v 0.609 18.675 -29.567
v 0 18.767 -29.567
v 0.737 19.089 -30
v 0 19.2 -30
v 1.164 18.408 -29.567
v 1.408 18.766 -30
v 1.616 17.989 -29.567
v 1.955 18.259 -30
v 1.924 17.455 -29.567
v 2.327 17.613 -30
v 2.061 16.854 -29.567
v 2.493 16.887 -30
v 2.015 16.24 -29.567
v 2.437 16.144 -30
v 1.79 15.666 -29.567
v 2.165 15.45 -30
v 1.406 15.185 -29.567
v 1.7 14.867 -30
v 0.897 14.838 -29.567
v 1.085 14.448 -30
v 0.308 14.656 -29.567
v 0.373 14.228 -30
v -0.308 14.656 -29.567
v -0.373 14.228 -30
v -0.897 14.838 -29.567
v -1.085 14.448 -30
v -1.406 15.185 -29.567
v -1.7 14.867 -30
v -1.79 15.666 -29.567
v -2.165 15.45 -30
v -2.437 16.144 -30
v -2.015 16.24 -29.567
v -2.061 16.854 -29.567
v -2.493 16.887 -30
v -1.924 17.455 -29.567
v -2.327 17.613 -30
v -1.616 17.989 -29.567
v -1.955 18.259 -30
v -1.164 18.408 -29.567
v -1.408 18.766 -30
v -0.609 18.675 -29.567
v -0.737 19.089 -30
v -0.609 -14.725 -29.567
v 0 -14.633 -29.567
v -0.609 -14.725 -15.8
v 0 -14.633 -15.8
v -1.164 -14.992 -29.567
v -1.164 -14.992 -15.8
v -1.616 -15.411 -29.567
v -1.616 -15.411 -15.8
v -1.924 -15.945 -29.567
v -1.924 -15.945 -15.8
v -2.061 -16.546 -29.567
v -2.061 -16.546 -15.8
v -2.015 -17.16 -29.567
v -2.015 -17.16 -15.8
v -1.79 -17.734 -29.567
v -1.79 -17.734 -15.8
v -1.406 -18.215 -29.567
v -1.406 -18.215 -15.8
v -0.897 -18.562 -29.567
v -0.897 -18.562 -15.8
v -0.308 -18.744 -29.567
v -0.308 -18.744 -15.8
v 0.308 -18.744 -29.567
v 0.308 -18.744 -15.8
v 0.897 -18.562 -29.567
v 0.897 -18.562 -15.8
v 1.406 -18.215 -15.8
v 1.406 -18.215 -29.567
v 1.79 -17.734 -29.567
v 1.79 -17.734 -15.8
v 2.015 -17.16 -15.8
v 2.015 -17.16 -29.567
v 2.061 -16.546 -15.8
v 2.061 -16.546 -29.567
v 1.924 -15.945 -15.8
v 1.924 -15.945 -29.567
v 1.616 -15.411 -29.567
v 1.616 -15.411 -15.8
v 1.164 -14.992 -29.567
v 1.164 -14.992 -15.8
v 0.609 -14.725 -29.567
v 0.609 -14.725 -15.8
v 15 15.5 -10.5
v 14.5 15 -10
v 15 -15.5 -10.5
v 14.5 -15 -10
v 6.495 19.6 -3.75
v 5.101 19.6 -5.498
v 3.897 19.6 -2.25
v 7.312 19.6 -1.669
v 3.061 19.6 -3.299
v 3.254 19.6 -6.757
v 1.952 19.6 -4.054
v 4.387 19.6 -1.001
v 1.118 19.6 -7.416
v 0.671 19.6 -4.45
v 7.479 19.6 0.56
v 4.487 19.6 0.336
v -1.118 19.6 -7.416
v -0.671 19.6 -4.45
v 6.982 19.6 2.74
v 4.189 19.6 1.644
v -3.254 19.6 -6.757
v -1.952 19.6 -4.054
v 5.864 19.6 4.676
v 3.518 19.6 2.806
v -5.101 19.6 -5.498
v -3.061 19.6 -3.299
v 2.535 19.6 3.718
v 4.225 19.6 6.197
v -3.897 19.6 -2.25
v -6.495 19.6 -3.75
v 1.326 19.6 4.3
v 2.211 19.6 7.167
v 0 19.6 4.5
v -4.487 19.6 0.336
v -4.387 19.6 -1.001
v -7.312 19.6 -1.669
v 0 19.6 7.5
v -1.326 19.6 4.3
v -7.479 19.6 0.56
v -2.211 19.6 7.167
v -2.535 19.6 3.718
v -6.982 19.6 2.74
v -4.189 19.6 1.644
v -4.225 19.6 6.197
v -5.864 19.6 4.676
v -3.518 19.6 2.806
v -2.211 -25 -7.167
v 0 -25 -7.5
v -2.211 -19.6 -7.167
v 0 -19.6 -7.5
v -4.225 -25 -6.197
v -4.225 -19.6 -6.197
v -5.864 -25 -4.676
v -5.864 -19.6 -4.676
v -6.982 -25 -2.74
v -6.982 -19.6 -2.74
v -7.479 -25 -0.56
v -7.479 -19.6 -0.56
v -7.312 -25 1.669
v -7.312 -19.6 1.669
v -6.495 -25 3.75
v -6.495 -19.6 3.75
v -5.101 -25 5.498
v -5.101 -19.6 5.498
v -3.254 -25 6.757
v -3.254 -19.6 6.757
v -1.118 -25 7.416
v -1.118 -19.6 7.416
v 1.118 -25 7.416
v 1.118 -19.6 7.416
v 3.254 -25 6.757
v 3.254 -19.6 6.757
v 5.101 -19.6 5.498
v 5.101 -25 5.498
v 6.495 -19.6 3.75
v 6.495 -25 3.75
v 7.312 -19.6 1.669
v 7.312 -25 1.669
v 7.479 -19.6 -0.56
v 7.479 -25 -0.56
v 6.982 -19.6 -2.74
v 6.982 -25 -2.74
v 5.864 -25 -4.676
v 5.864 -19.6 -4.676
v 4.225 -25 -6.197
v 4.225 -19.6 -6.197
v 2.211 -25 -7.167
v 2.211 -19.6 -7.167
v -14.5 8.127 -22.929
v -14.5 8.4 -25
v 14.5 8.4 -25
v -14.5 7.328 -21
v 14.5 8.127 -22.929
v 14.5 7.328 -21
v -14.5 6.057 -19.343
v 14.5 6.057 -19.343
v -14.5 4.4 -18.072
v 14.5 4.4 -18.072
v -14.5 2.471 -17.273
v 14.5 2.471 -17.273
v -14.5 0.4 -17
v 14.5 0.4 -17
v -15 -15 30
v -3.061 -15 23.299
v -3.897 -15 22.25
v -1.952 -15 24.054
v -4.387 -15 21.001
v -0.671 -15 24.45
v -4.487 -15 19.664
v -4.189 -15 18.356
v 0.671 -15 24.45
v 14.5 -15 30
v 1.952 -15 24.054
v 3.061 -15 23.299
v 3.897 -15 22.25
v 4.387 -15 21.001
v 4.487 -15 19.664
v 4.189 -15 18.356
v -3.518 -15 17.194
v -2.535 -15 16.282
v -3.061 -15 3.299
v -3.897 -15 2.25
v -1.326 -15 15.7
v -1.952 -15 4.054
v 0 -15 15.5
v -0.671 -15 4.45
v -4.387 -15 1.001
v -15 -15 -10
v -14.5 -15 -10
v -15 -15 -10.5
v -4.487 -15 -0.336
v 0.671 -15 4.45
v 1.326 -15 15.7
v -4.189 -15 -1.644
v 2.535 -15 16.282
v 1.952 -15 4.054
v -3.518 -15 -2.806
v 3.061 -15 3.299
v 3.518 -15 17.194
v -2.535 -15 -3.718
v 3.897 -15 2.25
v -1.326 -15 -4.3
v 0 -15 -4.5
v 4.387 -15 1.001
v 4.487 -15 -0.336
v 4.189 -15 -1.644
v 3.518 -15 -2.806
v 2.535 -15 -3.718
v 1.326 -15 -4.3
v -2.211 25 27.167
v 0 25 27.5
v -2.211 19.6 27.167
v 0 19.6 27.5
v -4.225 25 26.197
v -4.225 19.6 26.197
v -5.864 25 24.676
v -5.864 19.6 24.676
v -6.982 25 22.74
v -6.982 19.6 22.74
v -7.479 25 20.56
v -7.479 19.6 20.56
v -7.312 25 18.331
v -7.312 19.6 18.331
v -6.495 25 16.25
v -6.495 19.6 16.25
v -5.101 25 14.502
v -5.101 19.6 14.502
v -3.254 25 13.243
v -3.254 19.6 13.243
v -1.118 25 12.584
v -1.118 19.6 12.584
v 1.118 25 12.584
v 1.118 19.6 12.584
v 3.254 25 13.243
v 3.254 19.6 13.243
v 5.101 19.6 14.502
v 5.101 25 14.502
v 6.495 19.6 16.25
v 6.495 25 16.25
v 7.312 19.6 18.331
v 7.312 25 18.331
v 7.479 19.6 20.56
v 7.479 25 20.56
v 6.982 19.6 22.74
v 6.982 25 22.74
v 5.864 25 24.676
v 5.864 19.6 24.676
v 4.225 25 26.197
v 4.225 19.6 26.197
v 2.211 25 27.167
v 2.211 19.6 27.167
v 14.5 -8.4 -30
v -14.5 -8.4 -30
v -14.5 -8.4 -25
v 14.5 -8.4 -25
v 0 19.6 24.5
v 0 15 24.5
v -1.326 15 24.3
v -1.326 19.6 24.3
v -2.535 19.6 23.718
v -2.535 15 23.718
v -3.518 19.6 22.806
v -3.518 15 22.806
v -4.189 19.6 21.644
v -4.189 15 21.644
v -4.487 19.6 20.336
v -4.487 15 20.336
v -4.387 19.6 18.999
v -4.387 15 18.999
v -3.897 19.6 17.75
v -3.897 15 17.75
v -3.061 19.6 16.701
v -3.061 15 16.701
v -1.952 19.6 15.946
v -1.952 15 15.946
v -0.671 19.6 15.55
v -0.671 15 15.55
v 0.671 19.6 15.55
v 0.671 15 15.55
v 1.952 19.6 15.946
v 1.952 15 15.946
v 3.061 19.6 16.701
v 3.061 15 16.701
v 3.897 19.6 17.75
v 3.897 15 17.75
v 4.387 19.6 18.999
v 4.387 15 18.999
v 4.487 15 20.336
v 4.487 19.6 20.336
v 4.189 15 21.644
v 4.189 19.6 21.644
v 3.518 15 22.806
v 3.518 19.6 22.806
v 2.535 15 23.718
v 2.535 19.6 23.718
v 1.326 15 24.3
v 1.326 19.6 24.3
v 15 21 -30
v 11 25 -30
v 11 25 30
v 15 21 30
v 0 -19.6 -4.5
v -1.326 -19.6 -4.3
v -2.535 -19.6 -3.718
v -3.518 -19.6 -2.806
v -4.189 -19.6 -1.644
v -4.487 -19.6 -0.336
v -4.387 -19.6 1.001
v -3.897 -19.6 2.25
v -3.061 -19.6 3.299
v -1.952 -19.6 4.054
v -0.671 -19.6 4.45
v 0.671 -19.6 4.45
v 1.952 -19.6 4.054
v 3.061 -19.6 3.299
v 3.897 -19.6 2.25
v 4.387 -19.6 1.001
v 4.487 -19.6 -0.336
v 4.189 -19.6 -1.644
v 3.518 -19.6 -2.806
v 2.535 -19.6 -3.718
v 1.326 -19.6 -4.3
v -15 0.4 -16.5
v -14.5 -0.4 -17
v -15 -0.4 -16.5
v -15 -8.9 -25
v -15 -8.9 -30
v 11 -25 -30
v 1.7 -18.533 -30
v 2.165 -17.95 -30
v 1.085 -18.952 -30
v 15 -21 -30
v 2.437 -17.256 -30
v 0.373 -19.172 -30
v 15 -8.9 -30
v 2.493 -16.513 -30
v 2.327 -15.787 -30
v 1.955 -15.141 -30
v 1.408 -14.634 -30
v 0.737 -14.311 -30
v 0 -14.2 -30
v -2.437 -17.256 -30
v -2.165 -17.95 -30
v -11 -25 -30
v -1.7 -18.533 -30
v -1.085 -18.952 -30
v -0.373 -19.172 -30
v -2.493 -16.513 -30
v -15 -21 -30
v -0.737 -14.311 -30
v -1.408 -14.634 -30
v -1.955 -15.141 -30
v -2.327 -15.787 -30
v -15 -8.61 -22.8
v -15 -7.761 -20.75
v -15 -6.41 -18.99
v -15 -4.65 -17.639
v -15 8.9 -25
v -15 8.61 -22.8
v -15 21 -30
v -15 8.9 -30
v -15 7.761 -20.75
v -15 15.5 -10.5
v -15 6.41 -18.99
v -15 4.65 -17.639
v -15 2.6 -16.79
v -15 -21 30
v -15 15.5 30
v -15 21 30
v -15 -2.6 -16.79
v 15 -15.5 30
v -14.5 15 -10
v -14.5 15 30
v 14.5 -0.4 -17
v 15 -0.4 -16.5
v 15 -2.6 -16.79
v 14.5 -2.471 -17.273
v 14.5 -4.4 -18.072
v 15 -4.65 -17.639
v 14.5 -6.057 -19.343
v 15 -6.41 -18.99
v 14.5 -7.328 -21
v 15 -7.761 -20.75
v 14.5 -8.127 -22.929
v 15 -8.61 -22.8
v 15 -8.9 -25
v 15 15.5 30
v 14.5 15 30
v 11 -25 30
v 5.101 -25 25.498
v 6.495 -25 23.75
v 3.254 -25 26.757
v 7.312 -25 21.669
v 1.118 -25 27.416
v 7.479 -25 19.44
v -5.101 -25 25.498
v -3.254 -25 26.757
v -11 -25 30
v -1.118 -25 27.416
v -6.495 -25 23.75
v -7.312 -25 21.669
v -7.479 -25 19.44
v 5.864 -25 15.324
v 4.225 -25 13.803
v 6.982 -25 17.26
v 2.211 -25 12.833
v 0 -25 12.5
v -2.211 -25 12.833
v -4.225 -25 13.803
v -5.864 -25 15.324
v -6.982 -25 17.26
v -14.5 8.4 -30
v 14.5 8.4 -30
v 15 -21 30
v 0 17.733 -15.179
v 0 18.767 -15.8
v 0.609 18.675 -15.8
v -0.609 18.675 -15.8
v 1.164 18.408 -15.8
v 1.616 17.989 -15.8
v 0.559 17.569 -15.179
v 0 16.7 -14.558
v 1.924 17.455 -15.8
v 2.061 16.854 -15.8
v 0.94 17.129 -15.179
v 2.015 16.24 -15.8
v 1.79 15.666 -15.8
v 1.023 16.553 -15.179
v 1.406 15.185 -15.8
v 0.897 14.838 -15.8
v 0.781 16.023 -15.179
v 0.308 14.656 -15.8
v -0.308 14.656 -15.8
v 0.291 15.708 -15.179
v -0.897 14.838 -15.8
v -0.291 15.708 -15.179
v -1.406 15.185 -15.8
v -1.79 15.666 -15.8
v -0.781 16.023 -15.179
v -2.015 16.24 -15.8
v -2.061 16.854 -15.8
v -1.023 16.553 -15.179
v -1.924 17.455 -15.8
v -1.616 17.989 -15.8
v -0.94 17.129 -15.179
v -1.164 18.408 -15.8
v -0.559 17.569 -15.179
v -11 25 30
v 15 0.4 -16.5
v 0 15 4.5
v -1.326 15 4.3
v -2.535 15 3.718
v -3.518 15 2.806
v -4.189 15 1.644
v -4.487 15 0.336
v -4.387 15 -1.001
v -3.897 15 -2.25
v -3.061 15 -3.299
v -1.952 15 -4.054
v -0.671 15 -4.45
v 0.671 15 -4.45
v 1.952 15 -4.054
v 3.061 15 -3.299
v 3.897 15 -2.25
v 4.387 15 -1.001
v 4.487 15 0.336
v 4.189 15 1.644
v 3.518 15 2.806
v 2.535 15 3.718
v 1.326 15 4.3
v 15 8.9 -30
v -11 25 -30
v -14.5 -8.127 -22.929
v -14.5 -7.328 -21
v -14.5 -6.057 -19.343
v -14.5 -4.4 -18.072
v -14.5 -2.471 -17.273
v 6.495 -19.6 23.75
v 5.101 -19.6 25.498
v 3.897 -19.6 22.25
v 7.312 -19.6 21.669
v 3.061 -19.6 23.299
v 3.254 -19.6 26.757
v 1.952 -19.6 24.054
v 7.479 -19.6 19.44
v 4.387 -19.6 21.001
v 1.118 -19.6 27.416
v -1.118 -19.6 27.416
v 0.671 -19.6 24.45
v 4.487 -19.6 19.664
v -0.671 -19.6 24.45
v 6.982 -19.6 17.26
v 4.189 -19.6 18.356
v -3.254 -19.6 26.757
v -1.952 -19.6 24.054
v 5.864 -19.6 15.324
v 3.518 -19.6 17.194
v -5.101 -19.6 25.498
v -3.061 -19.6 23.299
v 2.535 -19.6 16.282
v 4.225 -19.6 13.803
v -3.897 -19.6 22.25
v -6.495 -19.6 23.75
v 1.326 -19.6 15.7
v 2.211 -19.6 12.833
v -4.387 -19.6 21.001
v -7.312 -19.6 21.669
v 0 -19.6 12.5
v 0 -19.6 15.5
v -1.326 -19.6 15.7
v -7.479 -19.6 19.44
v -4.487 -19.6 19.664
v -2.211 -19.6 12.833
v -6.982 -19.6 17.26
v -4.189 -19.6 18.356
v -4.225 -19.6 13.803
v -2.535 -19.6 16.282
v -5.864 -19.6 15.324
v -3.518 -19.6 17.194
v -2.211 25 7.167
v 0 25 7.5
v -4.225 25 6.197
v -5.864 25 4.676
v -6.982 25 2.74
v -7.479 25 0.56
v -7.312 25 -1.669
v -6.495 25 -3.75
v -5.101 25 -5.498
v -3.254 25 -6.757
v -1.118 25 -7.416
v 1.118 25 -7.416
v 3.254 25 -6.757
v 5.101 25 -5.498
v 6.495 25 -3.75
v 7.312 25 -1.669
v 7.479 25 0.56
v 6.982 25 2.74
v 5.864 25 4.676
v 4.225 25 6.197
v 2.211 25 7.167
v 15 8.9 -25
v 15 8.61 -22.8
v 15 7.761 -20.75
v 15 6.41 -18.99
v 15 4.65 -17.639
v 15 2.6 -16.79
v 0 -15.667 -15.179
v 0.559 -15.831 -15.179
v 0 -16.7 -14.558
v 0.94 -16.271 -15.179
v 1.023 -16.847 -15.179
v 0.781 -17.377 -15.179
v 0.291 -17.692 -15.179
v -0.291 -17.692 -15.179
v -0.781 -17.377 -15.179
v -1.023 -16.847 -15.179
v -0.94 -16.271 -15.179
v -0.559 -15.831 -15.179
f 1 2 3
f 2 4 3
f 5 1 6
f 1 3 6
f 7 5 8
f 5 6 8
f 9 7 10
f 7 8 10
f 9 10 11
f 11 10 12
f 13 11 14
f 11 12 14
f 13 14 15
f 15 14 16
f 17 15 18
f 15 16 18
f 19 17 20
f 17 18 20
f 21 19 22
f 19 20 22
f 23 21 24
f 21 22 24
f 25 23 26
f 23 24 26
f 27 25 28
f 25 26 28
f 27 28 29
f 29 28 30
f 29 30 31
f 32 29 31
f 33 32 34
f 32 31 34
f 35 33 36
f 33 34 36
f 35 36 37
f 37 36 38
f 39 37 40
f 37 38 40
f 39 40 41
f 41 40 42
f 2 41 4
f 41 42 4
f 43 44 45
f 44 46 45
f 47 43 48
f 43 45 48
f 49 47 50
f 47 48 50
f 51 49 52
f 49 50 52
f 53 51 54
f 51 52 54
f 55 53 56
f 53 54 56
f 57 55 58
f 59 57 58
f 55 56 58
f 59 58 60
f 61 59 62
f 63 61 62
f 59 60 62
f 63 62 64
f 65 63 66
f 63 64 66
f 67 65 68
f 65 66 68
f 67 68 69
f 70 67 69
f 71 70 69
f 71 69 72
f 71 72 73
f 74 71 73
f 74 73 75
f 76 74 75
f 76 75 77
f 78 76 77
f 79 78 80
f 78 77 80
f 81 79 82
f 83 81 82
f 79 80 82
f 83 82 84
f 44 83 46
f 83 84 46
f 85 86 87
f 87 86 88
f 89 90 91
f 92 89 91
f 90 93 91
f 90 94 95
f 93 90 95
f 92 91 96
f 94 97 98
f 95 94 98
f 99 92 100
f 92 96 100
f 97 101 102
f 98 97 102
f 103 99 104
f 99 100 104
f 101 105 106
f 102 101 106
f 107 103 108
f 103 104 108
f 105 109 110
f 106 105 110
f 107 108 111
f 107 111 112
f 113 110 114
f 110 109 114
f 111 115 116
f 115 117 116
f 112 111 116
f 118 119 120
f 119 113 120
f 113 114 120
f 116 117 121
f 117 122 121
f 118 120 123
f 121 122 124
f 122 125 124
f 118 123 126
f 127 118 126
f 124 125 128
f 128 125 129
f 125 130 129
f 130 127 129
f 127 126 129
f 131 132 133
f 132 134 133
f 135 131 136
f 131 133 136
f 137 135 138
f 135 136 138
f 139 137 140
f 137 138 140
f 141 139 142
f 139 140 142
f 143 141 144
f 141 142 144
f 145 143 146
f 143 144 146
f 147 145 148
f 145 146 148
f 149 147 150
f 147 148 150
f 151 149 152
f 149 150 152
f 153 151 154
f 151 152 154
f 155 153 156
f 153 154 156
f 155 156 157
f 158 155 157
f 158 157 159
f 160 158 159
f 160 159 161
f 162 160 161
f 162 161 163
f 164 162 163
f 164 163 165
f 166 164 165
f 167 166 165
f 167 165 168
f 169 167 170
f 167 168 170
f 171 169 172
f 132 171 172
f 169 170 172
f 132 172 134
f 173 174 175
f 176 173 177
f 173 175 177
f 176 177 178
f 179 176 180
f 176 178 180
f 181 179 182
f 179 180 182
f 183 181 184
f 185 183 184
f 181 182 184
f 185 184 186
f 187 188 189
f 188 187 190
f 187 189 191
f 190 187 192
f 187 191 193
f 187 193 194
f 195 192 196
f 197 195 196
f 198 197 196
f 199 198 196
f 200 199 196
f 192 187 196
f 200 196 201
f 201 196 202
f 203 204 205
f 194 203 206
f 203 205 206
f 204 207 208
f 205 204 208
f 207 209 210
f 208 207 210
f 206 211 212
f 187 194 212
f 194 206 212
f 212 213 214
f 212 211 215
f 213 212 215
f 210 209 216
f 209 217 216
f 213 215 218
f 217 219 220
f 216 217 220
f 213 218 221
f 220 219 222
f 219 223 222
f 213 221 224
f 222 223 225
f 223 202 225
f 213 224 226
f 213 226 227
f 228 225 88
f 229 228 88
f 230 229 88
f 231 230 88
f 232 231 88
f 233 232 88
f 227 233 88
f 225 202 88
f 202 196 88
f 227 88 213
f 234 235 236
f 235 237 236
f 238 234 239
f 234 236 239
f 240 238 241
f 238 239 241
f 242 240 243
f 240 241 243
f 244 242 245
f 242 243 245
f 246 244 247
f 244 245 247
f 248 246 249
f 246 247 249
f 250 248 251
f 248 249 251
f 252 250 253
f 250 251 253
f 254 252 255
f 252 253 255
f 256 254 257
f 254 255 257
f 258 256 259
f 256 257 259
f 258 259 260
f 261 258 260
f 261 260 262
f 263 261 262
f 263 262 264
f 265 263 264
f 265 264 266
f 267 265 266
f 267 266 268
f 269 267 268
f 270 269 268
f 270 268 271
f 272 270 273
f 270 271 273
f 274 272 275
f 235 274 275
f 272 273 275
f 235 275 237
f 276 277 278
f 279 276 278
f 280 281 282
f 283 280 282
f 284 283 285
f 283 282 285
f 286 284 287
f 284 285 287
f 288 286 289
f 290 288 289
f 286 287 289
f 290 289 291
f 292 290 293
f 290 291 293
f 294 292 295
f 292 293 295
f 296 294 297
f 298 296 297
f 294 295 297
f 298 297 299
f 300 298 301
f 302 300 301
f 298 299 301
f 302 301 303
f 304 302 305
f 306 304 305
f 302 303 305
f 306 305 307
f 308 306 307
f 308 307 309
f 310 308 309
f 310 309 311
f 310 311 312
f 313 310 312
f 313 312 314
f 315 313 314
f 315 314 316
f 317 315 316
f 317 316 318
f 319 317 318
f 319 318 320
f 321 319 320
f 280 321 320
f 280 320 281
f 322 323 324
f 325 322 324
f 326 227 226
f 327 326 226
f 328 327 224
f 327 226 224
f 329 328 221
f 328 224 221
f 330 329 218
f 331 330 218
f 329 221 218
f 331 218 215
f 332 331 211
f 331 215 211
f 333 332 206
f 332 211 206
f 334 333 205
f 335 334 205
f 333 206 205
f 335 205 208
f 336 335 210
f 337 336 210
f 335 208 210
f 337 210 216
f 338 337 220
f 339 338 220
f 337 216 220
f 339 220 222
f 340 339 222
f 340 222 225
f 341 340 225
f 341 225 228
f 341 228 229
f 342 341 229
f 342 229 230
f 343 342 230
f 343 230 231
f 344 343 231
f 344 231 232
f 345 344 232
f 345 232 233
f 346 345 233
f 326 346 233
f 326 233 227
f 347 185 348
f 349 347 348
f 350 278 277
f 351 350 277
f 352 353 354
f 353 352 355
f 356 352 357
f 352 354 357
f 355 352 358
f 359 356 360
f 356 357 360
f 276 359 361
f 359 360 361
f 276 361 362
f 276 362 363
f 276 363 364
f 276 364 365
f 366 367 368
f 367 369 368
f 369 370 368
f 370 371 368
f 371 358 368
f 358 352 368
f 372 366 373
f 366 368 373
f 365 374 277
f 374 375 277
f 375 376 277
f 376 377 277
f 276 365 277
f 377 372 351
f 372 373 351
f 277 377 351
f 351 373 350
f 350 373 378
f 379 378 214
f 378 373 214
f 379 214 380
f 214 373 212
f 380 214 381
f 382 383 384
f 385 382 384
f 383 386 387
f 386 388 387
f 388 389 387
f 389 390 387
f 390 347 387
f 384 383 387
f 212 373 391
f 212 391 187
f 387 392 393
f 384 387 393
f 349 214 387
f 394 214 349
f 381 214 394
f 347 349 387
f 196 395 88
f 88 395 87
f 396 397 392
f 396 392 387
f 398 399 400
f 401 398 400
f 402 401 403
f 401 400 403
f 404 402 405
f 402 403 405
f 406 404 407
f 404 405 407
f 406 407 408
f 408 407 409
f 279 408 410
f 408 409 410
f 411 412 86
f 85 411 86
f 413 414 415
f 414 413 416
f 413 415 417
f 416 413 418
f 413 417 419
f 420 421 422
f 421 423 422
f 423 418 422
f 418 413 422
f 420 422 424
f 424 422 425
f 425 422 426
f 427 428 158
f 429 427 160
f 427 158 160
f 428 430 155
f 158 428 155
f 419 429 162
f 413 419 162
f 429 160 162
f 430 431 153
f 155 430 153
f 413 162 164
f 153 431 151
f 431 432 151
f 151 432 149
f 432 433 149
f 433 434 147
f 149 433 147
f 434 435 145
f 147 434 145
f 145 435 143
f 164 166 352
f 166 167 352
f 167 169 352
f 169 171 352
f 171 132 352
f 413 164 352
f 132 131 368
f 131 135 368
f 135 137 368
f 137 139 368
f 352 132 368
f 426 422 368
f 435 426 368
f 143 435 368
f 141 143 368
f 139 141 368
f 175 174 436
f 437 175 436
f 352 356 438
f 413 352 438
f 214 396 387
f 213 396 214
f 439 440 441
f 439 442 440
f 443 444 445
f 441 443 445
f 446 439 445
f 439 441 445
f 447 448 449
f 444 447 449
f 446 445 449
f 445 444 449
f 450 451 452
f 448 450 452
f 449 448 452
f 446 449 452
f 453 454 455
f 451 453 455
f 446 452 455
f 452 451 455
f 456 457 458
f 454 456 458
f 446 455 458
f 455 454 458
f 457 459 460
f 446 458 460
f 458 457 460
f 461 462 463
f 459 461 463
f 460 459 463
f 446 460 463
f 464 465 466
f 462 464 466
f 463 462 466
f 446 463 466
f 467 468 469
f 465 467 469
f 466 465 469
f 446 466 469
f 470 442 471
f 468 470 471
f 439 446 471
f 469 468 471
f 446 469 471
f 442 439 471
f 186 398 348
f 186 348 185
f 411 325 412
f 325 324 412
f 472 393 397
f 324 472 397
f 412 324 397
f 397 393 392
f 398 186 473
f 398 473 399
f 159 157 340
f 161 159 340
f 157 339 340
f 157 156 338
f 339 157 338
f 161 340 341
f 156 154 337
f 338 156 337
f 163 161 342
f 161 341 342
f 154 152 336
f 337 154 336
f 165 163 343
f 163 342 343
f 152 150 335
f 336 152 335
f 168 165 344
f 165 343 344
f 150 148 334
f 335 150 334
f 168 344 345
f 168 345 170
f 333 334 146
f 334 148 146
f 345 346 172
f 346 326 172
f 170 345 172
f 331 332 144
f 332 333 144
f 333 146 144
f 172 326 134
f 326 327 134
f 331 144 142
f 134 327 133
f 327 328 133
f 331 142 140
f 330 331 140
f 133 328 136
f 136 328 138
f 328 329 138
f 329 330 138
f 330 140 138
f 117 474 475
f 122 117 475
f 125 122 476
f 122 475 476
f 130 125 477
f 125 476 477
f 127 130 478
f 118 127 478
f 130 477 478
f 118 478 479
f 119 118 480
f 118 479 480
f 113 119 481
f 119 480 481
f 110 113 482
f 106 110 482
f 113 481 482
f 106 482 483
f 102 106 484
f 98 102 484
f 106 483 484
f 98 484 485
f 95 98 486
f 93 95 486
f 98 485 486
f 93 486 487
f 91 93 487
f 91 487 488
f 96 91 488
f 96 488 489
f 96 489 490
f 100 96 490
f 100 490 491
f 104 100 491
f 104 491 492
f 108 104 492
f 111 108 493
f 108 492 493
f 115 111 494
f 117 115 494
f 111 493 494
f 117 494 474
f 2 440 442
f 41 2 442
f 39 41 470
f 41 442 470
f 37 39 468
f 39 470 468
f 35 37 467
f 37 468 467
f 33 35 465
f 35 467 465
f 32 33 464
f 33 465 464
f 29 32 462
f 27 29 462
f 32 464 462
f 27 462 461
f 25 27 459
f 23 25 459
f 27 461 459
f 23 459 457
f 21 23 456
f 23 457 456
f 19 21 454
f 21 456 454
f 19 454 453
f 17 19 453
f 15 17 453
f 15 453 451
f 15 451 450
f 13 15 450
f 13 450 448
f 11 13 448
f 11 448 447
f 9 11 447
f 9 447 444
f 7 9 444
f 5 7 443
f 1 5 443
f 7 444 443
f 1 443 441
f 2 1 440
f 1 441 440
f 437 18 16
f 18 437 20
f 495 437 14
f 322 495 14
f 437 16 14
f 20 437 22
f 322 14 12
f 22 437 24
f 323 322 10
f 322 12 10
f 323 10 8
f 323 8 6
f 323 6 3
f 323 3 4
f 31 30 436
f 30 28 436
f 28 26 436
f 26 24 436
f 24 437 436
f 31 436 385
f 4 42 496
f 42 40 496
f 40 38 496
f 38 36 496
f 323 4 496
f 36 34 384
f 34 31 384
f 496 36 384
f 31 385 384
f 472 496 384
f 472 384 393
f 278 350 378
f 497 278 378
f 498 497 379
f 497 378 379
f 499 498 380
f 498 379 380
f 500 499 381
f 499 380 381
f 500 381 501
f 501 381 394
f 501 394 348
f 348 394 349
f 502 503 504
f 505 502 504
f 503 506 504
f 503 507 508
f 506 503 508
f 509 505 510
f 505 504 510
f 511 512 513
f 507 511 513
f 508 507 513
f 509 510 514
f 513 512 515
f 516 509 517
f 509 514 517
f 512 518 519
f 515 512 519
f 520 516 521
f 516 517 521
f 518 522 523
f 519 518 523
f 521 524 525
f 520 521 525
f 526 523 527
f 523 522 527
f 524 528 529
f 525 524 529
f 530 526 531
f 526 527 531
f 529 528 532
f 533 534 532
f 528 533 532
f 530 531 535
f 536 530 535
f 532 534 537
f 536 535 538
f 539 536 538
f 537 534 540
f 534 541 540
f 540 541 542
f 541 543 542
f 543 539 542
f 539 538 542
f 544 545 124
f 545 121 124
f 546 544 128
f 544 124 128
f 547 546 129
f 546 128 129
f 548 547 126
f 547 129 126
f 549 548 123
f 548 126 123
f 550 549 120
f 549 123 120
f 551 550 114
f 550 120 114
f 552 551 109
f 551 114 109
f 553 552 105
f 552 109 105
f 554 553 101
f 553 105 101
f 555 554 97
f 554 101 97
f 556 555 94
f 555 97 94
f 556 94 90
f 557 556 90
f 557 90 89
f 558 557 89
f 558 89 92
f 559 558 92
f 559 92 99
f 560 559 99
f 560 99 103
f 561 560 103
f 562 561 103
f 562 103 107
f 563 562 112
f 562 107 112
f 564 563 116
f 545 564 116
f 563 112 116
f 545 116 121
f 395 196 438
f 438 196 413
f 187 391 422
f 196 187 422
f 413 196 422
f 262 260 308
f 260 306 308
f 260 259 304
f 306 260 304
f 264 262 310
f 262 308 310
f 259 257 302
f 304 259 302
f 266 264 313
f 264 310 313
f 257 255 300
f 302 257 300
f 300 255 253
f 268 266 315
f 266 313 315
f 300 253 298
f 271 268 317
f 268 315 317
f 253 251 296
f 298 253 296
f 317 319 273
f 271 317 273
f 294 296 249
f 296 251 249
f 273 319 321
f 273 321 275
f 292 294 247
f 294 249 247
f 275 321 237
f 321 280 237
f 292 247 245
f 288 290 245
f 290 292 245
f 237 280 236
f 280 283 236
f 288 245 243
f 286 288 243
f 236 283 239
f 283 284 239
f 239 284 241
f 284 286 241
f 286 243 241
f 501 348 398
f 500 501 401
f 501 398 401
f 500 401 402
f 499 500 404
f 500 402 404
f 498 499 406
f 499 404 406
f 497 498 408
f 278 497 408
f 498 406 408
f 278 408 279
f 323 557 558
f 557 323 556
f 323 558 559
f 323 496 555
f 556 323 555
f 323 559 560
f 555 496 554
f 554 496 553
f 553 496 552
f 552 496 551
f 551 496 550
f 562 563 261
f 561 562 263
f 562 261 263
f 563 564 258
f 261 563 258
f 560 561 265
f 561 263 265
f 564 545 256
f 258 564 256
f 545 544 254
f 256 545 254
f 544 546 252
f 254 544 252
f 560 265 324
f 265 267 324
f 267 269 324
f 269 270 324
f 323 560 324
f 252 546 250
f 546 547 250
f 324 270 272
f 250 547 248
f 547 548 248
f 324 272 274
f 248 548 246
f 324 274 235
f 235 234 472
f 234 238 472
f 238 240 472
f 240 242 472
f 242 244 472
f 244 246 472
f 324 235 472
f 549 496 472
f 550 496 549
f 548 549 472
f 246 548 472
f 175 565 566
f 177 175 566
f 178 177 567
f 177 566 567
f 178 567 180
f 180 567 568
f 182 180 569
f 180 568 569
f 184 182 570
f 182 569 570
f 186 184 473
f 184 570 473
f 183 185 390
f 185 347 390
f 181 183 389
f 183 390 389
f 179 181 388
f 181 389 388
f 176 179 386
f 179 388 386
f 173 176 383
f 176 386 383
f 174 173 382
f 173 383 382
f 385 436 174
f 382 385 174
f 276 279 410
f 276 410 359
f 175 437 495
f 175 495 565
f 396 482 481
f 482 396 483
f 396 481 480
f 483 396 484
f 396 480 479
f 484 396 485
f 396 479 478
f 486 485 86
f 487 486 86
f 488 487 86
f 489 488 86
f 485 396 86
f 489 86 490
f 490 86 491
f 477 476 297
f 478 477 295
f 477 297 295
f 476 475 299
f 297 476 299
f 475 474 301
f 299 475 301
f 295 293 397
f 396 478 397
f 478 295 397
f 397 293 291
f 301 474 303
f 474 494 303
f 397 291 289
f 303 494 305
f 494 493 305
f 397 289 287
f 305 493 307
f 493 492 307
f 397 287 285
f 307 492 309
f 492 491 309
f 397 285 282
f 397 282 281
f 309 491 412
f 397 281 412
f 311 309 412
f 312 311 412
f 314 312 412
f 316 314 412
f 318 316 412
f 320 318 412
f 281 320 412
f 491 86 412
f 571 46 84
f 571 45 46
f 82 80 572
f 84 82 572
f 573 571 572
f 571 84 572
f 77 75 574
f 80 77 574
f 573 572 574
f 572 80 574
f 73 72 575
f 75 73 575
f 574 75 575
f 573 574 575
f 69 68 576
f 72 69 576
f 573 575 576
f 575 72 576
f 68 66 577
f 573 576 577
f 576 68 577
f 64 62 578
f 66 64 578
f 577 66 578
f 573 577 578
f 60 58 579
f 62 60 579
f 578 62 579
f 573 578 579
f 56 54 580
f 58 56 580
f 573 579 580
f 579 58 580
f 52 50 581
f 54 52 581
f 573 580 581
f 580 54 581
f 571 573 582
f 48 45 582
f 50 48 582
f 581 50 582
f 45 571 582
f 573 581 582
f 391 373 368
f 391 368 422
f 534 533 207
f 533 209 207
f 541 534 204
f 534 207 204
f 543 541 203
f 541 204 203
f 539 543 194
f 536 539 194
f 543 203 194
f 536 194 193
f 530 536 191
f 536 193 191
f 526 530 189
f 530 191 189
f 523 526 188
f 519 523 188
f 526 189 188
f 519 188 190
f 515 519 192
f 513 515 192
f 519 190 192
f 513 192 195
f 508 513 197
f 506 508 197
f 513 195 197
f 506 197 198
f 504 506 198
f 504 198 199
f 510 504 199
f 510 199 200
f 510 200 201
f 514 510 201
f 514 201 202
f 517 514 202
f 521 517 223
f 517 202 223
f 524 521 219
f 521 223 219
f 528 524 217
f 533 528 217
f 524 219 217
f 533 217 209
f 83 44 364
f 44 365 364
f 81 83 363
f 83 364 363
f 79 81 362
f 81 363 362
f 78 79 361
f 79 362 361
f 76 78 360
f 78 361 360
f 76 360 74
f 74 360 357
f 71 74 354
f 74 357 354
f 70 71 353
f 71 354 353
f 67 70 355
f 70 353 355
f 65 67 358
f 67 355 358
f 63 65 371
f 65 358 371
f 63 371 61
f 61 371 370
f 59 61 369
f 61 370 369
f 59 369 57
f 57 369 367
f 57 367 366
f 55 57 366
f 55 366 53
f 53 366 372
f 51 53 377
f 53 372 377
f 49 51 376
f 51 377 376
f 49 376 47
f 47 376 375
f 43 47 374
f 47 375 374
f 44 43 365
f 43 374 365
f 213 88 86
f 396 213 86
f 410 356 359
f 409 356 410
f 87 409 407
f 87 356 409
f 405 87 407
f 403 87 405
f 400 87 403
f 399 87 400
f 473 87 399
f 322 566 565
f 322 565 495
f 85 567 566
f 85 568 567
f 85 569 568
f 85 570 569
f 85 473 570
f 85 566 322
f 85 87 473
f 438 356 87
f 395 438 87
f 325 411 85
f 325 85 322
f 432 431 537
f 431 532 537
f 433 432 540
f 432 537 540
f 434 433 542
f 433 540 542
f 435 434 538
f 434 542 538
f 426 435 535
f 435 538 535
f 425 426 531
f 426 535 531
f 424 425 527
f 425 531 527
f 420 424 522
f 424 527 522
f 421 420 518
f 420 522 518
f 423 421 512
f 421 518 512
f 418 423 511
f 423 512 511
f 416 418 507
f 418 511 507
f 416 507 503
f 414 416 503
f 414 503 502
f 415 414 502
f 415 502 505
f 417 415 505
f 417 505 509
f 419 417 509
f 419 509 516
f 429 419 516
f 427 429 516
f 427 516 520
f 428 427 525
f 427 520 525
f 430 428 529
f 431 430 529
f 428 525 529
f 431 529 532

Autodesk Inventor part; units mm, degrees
ref_plane "YZ Plane" through (0, 0, 0) normal (1, 0, 0) x (0, 1, 0)
ref_plane "XZ Plane" through (0, 0, 0) normal (0, 1, 0) x (-1, 0, 0)
ref_plane "XY Plane" through (0, 0, 0) normal (0, 0, 1) x (1, 0, 0)
sketch "Skizze1" plane through (0, 0, 0) normal (1, 0, 0) x (0, 1, 0)
  line L0 (-35, 0) -> (35, 0) construction
  line L1 (0, 42) -> (0, -42) construction
  line L2 (-25, -30) -> (25, -30)
  line L3 (25, -30) -> (25, 30)
  line L4 (25, 30) -> (-25, 30)
  line L5 (-25, 30) -> (-25, -30)
  line L6 (-25, -30) -> (25, 30) construction
  line L7 (25, -30) -> (-25, 30) construction
  point P0 (0, 0)
  dimension "d0" = 50
  dimension "d1" = 60
extrude "Grundkörper" add sketch "Skizze1" along normal mid plane 30
sketch "Skizze2" plane through (15, 0, 0) normal (1, 0, 0) x (0, 0, -1)
  line L0 (-30, 25) -> (-30, -25) construction
  line L1 (0, -35) -> (0, 35) construction
  line L2 (-42, 0) -> (42, 0) construction
  line L3 (-30, -15) -> (10, -15)
  line L4 (10, -15) -> (10, 15)
  line L5 (10, 15) -> (-30, 15)
  line L6 (-30, 15) -> (-30, -15)
  line L7 (30, -25) -> (30, 25) construction
  line L8 (30, -8.4) -> (25, -8.4)
  line L9 (17, -0.4) -> (17, 0.4)
  line L10 (25, 8.4) -> (30, 8.4)
  line L11 (30, -8.4) -> (30, 8.4)
  arc A0 (17, -0.4) -> (25, -8.4) centre (25, -0.4) ccw
  arc A1 (25, 8.4) -> (17, 0.4) centre (25, 0.4) ccw
  point P0 (0, 0)
  dimension "d4" = 40
  dimension "d5" = 30
  dimension "d14" = 13
  dimension "d15" = 16.8
  dimension "d16" = 8
extrude "Ausschnitt" cut sketch "Skizze2" against normal through all
sketch "Skizze4" plane through (-15, -25, -30) normal (0, -1, 0) x (1, 0, 0)
  line L0 (30, 20) -> (0, 20) construction
  line L1 (30, 60) -> (0, 60) construction
  line L2 (15, 72) -> (15, -12) projected
  line L3 (0, 40) -> (30, 40) construction
  line L4 (0, 0) -> (0, 60) construction
  line L5 (30, 60) -> (30, 0) construction
  point P0 (15, 30)
  point P1 (15, 50)
  point P2 (15, 30)
  dimension "d19" = 40
  dimension "d20" = 20
  dimension "d21" = 20
hole "DIN7984_M8_Boh" at (0, -25, 20) at (0, -25, 0) direction (0, 1, 0) diameter 9 end up to surface counterbore diameter 15 counterbore depth 5.4
mirror "Spiegeln_DIN7984_M8_Boh" about plane through (0, 0, 0) normal (0, 1, 0) of "DIN7984_M8_Boh"
sketch "Skizze5" plane through (15, -25, -30) normal (0, 0, -1) x (-1, 0, 0)
  line L0 (0, 0) -> (30, 0) construction
  line L1 (30, 16.6) -> (0, 16.6) construction
  line L2 (30, 50) -> (0, 50) construction
  line L3 (0, 33.4) -> (30, 33.4) construction
  line L4 (15, -10) -> (15, 60) construction
  line L5 (-6, 25) -> (36, 25) construction
  line L6 (15, 16.6) -> (15, 0) construction
  point P0 (15, 25)
  point P1 (15, 8.3)
  point P2 (15, 41.7)
  dimension "d29" = 33.4
hole "M5x10" at (0, -16.7, -30) at (0, 16.7, -30) direction (0, 0, 1) diameter 4.134 depth 14.2 tip angle 118 countersink diameter 5 countersink angle 90 thread size "M5x0.8" class "6H" standard "ISO Metric profile"
sketch "Skizze" plane through (15, -25, -30) normal (0, 0, -1) x (-1, 0, 0)
  circle A0 centre (15, 8.3) radius 2.5 projected
  line L0 (30, 16.6) -> (0, 16.6) projected
  line L1 (0, 0) -> (0, 16.6) projected
  line L2 (0, 0) -> (30, 0) projected
  line L3 (30, 16.6) -> (30, 0) projected
  circle A1 centre (15, 41.7) radius 2.5 projected
  line L4 (0, 33.4) -> (30, 33.4) projected
  line L5 (30, 50) -> (30, 33.4) projected
  line L6 (30, 50) -> (0, 50) projected
  line L7 (0, 33.4) -> (0, 50) projected
  line L8 (0, 16.6) -> (0, 24.6) projected
  line L9 (0, 24.6) -> (0, 25.4) projected
  line L10 (0, 25.4) -> (0, 33.4) projected
  line L11 (30, 33.4) -> (30, 25.4) projected
  line L12 (30, 25.4) -> (30, 24.6) projected
  line L13 (30, 24.6) -> (30, 16.6) projected
  point P0 (15, 25)
chamfer "Fase_Allgemein" distance 4 angle 45 4 edges at (15, -25, 0) (-15, -25, 0) (15, 25, 0) (-15, 25, 0)
chamfer "Fase" distance 0.5 angle 45 15 edges at (15, -6.0569, -19.3431) (15, 0, -17) (15, 6.0569, -19.3431) (15, 8.4, -27.5) (15, -8.4, -27.5) (-15, 6.0569, -19.3431) (-15, 0, -17) (-15, -6.0569, -19.3431) (-15, -8.4, -27.5) (-15, 8.4, -27.5) (-15, 0, -10) (-15, 15, 10) (15, -15, 10) (15, 0, -10) (15, 15, 10)
equation "\"d20\" = 0.5 * d19"
equation "\"d21\" = 0.5 * d19"
properties part number "200-50-WHEEL-CONNECTOR-30MM-01" material "Aluminium 6061"
